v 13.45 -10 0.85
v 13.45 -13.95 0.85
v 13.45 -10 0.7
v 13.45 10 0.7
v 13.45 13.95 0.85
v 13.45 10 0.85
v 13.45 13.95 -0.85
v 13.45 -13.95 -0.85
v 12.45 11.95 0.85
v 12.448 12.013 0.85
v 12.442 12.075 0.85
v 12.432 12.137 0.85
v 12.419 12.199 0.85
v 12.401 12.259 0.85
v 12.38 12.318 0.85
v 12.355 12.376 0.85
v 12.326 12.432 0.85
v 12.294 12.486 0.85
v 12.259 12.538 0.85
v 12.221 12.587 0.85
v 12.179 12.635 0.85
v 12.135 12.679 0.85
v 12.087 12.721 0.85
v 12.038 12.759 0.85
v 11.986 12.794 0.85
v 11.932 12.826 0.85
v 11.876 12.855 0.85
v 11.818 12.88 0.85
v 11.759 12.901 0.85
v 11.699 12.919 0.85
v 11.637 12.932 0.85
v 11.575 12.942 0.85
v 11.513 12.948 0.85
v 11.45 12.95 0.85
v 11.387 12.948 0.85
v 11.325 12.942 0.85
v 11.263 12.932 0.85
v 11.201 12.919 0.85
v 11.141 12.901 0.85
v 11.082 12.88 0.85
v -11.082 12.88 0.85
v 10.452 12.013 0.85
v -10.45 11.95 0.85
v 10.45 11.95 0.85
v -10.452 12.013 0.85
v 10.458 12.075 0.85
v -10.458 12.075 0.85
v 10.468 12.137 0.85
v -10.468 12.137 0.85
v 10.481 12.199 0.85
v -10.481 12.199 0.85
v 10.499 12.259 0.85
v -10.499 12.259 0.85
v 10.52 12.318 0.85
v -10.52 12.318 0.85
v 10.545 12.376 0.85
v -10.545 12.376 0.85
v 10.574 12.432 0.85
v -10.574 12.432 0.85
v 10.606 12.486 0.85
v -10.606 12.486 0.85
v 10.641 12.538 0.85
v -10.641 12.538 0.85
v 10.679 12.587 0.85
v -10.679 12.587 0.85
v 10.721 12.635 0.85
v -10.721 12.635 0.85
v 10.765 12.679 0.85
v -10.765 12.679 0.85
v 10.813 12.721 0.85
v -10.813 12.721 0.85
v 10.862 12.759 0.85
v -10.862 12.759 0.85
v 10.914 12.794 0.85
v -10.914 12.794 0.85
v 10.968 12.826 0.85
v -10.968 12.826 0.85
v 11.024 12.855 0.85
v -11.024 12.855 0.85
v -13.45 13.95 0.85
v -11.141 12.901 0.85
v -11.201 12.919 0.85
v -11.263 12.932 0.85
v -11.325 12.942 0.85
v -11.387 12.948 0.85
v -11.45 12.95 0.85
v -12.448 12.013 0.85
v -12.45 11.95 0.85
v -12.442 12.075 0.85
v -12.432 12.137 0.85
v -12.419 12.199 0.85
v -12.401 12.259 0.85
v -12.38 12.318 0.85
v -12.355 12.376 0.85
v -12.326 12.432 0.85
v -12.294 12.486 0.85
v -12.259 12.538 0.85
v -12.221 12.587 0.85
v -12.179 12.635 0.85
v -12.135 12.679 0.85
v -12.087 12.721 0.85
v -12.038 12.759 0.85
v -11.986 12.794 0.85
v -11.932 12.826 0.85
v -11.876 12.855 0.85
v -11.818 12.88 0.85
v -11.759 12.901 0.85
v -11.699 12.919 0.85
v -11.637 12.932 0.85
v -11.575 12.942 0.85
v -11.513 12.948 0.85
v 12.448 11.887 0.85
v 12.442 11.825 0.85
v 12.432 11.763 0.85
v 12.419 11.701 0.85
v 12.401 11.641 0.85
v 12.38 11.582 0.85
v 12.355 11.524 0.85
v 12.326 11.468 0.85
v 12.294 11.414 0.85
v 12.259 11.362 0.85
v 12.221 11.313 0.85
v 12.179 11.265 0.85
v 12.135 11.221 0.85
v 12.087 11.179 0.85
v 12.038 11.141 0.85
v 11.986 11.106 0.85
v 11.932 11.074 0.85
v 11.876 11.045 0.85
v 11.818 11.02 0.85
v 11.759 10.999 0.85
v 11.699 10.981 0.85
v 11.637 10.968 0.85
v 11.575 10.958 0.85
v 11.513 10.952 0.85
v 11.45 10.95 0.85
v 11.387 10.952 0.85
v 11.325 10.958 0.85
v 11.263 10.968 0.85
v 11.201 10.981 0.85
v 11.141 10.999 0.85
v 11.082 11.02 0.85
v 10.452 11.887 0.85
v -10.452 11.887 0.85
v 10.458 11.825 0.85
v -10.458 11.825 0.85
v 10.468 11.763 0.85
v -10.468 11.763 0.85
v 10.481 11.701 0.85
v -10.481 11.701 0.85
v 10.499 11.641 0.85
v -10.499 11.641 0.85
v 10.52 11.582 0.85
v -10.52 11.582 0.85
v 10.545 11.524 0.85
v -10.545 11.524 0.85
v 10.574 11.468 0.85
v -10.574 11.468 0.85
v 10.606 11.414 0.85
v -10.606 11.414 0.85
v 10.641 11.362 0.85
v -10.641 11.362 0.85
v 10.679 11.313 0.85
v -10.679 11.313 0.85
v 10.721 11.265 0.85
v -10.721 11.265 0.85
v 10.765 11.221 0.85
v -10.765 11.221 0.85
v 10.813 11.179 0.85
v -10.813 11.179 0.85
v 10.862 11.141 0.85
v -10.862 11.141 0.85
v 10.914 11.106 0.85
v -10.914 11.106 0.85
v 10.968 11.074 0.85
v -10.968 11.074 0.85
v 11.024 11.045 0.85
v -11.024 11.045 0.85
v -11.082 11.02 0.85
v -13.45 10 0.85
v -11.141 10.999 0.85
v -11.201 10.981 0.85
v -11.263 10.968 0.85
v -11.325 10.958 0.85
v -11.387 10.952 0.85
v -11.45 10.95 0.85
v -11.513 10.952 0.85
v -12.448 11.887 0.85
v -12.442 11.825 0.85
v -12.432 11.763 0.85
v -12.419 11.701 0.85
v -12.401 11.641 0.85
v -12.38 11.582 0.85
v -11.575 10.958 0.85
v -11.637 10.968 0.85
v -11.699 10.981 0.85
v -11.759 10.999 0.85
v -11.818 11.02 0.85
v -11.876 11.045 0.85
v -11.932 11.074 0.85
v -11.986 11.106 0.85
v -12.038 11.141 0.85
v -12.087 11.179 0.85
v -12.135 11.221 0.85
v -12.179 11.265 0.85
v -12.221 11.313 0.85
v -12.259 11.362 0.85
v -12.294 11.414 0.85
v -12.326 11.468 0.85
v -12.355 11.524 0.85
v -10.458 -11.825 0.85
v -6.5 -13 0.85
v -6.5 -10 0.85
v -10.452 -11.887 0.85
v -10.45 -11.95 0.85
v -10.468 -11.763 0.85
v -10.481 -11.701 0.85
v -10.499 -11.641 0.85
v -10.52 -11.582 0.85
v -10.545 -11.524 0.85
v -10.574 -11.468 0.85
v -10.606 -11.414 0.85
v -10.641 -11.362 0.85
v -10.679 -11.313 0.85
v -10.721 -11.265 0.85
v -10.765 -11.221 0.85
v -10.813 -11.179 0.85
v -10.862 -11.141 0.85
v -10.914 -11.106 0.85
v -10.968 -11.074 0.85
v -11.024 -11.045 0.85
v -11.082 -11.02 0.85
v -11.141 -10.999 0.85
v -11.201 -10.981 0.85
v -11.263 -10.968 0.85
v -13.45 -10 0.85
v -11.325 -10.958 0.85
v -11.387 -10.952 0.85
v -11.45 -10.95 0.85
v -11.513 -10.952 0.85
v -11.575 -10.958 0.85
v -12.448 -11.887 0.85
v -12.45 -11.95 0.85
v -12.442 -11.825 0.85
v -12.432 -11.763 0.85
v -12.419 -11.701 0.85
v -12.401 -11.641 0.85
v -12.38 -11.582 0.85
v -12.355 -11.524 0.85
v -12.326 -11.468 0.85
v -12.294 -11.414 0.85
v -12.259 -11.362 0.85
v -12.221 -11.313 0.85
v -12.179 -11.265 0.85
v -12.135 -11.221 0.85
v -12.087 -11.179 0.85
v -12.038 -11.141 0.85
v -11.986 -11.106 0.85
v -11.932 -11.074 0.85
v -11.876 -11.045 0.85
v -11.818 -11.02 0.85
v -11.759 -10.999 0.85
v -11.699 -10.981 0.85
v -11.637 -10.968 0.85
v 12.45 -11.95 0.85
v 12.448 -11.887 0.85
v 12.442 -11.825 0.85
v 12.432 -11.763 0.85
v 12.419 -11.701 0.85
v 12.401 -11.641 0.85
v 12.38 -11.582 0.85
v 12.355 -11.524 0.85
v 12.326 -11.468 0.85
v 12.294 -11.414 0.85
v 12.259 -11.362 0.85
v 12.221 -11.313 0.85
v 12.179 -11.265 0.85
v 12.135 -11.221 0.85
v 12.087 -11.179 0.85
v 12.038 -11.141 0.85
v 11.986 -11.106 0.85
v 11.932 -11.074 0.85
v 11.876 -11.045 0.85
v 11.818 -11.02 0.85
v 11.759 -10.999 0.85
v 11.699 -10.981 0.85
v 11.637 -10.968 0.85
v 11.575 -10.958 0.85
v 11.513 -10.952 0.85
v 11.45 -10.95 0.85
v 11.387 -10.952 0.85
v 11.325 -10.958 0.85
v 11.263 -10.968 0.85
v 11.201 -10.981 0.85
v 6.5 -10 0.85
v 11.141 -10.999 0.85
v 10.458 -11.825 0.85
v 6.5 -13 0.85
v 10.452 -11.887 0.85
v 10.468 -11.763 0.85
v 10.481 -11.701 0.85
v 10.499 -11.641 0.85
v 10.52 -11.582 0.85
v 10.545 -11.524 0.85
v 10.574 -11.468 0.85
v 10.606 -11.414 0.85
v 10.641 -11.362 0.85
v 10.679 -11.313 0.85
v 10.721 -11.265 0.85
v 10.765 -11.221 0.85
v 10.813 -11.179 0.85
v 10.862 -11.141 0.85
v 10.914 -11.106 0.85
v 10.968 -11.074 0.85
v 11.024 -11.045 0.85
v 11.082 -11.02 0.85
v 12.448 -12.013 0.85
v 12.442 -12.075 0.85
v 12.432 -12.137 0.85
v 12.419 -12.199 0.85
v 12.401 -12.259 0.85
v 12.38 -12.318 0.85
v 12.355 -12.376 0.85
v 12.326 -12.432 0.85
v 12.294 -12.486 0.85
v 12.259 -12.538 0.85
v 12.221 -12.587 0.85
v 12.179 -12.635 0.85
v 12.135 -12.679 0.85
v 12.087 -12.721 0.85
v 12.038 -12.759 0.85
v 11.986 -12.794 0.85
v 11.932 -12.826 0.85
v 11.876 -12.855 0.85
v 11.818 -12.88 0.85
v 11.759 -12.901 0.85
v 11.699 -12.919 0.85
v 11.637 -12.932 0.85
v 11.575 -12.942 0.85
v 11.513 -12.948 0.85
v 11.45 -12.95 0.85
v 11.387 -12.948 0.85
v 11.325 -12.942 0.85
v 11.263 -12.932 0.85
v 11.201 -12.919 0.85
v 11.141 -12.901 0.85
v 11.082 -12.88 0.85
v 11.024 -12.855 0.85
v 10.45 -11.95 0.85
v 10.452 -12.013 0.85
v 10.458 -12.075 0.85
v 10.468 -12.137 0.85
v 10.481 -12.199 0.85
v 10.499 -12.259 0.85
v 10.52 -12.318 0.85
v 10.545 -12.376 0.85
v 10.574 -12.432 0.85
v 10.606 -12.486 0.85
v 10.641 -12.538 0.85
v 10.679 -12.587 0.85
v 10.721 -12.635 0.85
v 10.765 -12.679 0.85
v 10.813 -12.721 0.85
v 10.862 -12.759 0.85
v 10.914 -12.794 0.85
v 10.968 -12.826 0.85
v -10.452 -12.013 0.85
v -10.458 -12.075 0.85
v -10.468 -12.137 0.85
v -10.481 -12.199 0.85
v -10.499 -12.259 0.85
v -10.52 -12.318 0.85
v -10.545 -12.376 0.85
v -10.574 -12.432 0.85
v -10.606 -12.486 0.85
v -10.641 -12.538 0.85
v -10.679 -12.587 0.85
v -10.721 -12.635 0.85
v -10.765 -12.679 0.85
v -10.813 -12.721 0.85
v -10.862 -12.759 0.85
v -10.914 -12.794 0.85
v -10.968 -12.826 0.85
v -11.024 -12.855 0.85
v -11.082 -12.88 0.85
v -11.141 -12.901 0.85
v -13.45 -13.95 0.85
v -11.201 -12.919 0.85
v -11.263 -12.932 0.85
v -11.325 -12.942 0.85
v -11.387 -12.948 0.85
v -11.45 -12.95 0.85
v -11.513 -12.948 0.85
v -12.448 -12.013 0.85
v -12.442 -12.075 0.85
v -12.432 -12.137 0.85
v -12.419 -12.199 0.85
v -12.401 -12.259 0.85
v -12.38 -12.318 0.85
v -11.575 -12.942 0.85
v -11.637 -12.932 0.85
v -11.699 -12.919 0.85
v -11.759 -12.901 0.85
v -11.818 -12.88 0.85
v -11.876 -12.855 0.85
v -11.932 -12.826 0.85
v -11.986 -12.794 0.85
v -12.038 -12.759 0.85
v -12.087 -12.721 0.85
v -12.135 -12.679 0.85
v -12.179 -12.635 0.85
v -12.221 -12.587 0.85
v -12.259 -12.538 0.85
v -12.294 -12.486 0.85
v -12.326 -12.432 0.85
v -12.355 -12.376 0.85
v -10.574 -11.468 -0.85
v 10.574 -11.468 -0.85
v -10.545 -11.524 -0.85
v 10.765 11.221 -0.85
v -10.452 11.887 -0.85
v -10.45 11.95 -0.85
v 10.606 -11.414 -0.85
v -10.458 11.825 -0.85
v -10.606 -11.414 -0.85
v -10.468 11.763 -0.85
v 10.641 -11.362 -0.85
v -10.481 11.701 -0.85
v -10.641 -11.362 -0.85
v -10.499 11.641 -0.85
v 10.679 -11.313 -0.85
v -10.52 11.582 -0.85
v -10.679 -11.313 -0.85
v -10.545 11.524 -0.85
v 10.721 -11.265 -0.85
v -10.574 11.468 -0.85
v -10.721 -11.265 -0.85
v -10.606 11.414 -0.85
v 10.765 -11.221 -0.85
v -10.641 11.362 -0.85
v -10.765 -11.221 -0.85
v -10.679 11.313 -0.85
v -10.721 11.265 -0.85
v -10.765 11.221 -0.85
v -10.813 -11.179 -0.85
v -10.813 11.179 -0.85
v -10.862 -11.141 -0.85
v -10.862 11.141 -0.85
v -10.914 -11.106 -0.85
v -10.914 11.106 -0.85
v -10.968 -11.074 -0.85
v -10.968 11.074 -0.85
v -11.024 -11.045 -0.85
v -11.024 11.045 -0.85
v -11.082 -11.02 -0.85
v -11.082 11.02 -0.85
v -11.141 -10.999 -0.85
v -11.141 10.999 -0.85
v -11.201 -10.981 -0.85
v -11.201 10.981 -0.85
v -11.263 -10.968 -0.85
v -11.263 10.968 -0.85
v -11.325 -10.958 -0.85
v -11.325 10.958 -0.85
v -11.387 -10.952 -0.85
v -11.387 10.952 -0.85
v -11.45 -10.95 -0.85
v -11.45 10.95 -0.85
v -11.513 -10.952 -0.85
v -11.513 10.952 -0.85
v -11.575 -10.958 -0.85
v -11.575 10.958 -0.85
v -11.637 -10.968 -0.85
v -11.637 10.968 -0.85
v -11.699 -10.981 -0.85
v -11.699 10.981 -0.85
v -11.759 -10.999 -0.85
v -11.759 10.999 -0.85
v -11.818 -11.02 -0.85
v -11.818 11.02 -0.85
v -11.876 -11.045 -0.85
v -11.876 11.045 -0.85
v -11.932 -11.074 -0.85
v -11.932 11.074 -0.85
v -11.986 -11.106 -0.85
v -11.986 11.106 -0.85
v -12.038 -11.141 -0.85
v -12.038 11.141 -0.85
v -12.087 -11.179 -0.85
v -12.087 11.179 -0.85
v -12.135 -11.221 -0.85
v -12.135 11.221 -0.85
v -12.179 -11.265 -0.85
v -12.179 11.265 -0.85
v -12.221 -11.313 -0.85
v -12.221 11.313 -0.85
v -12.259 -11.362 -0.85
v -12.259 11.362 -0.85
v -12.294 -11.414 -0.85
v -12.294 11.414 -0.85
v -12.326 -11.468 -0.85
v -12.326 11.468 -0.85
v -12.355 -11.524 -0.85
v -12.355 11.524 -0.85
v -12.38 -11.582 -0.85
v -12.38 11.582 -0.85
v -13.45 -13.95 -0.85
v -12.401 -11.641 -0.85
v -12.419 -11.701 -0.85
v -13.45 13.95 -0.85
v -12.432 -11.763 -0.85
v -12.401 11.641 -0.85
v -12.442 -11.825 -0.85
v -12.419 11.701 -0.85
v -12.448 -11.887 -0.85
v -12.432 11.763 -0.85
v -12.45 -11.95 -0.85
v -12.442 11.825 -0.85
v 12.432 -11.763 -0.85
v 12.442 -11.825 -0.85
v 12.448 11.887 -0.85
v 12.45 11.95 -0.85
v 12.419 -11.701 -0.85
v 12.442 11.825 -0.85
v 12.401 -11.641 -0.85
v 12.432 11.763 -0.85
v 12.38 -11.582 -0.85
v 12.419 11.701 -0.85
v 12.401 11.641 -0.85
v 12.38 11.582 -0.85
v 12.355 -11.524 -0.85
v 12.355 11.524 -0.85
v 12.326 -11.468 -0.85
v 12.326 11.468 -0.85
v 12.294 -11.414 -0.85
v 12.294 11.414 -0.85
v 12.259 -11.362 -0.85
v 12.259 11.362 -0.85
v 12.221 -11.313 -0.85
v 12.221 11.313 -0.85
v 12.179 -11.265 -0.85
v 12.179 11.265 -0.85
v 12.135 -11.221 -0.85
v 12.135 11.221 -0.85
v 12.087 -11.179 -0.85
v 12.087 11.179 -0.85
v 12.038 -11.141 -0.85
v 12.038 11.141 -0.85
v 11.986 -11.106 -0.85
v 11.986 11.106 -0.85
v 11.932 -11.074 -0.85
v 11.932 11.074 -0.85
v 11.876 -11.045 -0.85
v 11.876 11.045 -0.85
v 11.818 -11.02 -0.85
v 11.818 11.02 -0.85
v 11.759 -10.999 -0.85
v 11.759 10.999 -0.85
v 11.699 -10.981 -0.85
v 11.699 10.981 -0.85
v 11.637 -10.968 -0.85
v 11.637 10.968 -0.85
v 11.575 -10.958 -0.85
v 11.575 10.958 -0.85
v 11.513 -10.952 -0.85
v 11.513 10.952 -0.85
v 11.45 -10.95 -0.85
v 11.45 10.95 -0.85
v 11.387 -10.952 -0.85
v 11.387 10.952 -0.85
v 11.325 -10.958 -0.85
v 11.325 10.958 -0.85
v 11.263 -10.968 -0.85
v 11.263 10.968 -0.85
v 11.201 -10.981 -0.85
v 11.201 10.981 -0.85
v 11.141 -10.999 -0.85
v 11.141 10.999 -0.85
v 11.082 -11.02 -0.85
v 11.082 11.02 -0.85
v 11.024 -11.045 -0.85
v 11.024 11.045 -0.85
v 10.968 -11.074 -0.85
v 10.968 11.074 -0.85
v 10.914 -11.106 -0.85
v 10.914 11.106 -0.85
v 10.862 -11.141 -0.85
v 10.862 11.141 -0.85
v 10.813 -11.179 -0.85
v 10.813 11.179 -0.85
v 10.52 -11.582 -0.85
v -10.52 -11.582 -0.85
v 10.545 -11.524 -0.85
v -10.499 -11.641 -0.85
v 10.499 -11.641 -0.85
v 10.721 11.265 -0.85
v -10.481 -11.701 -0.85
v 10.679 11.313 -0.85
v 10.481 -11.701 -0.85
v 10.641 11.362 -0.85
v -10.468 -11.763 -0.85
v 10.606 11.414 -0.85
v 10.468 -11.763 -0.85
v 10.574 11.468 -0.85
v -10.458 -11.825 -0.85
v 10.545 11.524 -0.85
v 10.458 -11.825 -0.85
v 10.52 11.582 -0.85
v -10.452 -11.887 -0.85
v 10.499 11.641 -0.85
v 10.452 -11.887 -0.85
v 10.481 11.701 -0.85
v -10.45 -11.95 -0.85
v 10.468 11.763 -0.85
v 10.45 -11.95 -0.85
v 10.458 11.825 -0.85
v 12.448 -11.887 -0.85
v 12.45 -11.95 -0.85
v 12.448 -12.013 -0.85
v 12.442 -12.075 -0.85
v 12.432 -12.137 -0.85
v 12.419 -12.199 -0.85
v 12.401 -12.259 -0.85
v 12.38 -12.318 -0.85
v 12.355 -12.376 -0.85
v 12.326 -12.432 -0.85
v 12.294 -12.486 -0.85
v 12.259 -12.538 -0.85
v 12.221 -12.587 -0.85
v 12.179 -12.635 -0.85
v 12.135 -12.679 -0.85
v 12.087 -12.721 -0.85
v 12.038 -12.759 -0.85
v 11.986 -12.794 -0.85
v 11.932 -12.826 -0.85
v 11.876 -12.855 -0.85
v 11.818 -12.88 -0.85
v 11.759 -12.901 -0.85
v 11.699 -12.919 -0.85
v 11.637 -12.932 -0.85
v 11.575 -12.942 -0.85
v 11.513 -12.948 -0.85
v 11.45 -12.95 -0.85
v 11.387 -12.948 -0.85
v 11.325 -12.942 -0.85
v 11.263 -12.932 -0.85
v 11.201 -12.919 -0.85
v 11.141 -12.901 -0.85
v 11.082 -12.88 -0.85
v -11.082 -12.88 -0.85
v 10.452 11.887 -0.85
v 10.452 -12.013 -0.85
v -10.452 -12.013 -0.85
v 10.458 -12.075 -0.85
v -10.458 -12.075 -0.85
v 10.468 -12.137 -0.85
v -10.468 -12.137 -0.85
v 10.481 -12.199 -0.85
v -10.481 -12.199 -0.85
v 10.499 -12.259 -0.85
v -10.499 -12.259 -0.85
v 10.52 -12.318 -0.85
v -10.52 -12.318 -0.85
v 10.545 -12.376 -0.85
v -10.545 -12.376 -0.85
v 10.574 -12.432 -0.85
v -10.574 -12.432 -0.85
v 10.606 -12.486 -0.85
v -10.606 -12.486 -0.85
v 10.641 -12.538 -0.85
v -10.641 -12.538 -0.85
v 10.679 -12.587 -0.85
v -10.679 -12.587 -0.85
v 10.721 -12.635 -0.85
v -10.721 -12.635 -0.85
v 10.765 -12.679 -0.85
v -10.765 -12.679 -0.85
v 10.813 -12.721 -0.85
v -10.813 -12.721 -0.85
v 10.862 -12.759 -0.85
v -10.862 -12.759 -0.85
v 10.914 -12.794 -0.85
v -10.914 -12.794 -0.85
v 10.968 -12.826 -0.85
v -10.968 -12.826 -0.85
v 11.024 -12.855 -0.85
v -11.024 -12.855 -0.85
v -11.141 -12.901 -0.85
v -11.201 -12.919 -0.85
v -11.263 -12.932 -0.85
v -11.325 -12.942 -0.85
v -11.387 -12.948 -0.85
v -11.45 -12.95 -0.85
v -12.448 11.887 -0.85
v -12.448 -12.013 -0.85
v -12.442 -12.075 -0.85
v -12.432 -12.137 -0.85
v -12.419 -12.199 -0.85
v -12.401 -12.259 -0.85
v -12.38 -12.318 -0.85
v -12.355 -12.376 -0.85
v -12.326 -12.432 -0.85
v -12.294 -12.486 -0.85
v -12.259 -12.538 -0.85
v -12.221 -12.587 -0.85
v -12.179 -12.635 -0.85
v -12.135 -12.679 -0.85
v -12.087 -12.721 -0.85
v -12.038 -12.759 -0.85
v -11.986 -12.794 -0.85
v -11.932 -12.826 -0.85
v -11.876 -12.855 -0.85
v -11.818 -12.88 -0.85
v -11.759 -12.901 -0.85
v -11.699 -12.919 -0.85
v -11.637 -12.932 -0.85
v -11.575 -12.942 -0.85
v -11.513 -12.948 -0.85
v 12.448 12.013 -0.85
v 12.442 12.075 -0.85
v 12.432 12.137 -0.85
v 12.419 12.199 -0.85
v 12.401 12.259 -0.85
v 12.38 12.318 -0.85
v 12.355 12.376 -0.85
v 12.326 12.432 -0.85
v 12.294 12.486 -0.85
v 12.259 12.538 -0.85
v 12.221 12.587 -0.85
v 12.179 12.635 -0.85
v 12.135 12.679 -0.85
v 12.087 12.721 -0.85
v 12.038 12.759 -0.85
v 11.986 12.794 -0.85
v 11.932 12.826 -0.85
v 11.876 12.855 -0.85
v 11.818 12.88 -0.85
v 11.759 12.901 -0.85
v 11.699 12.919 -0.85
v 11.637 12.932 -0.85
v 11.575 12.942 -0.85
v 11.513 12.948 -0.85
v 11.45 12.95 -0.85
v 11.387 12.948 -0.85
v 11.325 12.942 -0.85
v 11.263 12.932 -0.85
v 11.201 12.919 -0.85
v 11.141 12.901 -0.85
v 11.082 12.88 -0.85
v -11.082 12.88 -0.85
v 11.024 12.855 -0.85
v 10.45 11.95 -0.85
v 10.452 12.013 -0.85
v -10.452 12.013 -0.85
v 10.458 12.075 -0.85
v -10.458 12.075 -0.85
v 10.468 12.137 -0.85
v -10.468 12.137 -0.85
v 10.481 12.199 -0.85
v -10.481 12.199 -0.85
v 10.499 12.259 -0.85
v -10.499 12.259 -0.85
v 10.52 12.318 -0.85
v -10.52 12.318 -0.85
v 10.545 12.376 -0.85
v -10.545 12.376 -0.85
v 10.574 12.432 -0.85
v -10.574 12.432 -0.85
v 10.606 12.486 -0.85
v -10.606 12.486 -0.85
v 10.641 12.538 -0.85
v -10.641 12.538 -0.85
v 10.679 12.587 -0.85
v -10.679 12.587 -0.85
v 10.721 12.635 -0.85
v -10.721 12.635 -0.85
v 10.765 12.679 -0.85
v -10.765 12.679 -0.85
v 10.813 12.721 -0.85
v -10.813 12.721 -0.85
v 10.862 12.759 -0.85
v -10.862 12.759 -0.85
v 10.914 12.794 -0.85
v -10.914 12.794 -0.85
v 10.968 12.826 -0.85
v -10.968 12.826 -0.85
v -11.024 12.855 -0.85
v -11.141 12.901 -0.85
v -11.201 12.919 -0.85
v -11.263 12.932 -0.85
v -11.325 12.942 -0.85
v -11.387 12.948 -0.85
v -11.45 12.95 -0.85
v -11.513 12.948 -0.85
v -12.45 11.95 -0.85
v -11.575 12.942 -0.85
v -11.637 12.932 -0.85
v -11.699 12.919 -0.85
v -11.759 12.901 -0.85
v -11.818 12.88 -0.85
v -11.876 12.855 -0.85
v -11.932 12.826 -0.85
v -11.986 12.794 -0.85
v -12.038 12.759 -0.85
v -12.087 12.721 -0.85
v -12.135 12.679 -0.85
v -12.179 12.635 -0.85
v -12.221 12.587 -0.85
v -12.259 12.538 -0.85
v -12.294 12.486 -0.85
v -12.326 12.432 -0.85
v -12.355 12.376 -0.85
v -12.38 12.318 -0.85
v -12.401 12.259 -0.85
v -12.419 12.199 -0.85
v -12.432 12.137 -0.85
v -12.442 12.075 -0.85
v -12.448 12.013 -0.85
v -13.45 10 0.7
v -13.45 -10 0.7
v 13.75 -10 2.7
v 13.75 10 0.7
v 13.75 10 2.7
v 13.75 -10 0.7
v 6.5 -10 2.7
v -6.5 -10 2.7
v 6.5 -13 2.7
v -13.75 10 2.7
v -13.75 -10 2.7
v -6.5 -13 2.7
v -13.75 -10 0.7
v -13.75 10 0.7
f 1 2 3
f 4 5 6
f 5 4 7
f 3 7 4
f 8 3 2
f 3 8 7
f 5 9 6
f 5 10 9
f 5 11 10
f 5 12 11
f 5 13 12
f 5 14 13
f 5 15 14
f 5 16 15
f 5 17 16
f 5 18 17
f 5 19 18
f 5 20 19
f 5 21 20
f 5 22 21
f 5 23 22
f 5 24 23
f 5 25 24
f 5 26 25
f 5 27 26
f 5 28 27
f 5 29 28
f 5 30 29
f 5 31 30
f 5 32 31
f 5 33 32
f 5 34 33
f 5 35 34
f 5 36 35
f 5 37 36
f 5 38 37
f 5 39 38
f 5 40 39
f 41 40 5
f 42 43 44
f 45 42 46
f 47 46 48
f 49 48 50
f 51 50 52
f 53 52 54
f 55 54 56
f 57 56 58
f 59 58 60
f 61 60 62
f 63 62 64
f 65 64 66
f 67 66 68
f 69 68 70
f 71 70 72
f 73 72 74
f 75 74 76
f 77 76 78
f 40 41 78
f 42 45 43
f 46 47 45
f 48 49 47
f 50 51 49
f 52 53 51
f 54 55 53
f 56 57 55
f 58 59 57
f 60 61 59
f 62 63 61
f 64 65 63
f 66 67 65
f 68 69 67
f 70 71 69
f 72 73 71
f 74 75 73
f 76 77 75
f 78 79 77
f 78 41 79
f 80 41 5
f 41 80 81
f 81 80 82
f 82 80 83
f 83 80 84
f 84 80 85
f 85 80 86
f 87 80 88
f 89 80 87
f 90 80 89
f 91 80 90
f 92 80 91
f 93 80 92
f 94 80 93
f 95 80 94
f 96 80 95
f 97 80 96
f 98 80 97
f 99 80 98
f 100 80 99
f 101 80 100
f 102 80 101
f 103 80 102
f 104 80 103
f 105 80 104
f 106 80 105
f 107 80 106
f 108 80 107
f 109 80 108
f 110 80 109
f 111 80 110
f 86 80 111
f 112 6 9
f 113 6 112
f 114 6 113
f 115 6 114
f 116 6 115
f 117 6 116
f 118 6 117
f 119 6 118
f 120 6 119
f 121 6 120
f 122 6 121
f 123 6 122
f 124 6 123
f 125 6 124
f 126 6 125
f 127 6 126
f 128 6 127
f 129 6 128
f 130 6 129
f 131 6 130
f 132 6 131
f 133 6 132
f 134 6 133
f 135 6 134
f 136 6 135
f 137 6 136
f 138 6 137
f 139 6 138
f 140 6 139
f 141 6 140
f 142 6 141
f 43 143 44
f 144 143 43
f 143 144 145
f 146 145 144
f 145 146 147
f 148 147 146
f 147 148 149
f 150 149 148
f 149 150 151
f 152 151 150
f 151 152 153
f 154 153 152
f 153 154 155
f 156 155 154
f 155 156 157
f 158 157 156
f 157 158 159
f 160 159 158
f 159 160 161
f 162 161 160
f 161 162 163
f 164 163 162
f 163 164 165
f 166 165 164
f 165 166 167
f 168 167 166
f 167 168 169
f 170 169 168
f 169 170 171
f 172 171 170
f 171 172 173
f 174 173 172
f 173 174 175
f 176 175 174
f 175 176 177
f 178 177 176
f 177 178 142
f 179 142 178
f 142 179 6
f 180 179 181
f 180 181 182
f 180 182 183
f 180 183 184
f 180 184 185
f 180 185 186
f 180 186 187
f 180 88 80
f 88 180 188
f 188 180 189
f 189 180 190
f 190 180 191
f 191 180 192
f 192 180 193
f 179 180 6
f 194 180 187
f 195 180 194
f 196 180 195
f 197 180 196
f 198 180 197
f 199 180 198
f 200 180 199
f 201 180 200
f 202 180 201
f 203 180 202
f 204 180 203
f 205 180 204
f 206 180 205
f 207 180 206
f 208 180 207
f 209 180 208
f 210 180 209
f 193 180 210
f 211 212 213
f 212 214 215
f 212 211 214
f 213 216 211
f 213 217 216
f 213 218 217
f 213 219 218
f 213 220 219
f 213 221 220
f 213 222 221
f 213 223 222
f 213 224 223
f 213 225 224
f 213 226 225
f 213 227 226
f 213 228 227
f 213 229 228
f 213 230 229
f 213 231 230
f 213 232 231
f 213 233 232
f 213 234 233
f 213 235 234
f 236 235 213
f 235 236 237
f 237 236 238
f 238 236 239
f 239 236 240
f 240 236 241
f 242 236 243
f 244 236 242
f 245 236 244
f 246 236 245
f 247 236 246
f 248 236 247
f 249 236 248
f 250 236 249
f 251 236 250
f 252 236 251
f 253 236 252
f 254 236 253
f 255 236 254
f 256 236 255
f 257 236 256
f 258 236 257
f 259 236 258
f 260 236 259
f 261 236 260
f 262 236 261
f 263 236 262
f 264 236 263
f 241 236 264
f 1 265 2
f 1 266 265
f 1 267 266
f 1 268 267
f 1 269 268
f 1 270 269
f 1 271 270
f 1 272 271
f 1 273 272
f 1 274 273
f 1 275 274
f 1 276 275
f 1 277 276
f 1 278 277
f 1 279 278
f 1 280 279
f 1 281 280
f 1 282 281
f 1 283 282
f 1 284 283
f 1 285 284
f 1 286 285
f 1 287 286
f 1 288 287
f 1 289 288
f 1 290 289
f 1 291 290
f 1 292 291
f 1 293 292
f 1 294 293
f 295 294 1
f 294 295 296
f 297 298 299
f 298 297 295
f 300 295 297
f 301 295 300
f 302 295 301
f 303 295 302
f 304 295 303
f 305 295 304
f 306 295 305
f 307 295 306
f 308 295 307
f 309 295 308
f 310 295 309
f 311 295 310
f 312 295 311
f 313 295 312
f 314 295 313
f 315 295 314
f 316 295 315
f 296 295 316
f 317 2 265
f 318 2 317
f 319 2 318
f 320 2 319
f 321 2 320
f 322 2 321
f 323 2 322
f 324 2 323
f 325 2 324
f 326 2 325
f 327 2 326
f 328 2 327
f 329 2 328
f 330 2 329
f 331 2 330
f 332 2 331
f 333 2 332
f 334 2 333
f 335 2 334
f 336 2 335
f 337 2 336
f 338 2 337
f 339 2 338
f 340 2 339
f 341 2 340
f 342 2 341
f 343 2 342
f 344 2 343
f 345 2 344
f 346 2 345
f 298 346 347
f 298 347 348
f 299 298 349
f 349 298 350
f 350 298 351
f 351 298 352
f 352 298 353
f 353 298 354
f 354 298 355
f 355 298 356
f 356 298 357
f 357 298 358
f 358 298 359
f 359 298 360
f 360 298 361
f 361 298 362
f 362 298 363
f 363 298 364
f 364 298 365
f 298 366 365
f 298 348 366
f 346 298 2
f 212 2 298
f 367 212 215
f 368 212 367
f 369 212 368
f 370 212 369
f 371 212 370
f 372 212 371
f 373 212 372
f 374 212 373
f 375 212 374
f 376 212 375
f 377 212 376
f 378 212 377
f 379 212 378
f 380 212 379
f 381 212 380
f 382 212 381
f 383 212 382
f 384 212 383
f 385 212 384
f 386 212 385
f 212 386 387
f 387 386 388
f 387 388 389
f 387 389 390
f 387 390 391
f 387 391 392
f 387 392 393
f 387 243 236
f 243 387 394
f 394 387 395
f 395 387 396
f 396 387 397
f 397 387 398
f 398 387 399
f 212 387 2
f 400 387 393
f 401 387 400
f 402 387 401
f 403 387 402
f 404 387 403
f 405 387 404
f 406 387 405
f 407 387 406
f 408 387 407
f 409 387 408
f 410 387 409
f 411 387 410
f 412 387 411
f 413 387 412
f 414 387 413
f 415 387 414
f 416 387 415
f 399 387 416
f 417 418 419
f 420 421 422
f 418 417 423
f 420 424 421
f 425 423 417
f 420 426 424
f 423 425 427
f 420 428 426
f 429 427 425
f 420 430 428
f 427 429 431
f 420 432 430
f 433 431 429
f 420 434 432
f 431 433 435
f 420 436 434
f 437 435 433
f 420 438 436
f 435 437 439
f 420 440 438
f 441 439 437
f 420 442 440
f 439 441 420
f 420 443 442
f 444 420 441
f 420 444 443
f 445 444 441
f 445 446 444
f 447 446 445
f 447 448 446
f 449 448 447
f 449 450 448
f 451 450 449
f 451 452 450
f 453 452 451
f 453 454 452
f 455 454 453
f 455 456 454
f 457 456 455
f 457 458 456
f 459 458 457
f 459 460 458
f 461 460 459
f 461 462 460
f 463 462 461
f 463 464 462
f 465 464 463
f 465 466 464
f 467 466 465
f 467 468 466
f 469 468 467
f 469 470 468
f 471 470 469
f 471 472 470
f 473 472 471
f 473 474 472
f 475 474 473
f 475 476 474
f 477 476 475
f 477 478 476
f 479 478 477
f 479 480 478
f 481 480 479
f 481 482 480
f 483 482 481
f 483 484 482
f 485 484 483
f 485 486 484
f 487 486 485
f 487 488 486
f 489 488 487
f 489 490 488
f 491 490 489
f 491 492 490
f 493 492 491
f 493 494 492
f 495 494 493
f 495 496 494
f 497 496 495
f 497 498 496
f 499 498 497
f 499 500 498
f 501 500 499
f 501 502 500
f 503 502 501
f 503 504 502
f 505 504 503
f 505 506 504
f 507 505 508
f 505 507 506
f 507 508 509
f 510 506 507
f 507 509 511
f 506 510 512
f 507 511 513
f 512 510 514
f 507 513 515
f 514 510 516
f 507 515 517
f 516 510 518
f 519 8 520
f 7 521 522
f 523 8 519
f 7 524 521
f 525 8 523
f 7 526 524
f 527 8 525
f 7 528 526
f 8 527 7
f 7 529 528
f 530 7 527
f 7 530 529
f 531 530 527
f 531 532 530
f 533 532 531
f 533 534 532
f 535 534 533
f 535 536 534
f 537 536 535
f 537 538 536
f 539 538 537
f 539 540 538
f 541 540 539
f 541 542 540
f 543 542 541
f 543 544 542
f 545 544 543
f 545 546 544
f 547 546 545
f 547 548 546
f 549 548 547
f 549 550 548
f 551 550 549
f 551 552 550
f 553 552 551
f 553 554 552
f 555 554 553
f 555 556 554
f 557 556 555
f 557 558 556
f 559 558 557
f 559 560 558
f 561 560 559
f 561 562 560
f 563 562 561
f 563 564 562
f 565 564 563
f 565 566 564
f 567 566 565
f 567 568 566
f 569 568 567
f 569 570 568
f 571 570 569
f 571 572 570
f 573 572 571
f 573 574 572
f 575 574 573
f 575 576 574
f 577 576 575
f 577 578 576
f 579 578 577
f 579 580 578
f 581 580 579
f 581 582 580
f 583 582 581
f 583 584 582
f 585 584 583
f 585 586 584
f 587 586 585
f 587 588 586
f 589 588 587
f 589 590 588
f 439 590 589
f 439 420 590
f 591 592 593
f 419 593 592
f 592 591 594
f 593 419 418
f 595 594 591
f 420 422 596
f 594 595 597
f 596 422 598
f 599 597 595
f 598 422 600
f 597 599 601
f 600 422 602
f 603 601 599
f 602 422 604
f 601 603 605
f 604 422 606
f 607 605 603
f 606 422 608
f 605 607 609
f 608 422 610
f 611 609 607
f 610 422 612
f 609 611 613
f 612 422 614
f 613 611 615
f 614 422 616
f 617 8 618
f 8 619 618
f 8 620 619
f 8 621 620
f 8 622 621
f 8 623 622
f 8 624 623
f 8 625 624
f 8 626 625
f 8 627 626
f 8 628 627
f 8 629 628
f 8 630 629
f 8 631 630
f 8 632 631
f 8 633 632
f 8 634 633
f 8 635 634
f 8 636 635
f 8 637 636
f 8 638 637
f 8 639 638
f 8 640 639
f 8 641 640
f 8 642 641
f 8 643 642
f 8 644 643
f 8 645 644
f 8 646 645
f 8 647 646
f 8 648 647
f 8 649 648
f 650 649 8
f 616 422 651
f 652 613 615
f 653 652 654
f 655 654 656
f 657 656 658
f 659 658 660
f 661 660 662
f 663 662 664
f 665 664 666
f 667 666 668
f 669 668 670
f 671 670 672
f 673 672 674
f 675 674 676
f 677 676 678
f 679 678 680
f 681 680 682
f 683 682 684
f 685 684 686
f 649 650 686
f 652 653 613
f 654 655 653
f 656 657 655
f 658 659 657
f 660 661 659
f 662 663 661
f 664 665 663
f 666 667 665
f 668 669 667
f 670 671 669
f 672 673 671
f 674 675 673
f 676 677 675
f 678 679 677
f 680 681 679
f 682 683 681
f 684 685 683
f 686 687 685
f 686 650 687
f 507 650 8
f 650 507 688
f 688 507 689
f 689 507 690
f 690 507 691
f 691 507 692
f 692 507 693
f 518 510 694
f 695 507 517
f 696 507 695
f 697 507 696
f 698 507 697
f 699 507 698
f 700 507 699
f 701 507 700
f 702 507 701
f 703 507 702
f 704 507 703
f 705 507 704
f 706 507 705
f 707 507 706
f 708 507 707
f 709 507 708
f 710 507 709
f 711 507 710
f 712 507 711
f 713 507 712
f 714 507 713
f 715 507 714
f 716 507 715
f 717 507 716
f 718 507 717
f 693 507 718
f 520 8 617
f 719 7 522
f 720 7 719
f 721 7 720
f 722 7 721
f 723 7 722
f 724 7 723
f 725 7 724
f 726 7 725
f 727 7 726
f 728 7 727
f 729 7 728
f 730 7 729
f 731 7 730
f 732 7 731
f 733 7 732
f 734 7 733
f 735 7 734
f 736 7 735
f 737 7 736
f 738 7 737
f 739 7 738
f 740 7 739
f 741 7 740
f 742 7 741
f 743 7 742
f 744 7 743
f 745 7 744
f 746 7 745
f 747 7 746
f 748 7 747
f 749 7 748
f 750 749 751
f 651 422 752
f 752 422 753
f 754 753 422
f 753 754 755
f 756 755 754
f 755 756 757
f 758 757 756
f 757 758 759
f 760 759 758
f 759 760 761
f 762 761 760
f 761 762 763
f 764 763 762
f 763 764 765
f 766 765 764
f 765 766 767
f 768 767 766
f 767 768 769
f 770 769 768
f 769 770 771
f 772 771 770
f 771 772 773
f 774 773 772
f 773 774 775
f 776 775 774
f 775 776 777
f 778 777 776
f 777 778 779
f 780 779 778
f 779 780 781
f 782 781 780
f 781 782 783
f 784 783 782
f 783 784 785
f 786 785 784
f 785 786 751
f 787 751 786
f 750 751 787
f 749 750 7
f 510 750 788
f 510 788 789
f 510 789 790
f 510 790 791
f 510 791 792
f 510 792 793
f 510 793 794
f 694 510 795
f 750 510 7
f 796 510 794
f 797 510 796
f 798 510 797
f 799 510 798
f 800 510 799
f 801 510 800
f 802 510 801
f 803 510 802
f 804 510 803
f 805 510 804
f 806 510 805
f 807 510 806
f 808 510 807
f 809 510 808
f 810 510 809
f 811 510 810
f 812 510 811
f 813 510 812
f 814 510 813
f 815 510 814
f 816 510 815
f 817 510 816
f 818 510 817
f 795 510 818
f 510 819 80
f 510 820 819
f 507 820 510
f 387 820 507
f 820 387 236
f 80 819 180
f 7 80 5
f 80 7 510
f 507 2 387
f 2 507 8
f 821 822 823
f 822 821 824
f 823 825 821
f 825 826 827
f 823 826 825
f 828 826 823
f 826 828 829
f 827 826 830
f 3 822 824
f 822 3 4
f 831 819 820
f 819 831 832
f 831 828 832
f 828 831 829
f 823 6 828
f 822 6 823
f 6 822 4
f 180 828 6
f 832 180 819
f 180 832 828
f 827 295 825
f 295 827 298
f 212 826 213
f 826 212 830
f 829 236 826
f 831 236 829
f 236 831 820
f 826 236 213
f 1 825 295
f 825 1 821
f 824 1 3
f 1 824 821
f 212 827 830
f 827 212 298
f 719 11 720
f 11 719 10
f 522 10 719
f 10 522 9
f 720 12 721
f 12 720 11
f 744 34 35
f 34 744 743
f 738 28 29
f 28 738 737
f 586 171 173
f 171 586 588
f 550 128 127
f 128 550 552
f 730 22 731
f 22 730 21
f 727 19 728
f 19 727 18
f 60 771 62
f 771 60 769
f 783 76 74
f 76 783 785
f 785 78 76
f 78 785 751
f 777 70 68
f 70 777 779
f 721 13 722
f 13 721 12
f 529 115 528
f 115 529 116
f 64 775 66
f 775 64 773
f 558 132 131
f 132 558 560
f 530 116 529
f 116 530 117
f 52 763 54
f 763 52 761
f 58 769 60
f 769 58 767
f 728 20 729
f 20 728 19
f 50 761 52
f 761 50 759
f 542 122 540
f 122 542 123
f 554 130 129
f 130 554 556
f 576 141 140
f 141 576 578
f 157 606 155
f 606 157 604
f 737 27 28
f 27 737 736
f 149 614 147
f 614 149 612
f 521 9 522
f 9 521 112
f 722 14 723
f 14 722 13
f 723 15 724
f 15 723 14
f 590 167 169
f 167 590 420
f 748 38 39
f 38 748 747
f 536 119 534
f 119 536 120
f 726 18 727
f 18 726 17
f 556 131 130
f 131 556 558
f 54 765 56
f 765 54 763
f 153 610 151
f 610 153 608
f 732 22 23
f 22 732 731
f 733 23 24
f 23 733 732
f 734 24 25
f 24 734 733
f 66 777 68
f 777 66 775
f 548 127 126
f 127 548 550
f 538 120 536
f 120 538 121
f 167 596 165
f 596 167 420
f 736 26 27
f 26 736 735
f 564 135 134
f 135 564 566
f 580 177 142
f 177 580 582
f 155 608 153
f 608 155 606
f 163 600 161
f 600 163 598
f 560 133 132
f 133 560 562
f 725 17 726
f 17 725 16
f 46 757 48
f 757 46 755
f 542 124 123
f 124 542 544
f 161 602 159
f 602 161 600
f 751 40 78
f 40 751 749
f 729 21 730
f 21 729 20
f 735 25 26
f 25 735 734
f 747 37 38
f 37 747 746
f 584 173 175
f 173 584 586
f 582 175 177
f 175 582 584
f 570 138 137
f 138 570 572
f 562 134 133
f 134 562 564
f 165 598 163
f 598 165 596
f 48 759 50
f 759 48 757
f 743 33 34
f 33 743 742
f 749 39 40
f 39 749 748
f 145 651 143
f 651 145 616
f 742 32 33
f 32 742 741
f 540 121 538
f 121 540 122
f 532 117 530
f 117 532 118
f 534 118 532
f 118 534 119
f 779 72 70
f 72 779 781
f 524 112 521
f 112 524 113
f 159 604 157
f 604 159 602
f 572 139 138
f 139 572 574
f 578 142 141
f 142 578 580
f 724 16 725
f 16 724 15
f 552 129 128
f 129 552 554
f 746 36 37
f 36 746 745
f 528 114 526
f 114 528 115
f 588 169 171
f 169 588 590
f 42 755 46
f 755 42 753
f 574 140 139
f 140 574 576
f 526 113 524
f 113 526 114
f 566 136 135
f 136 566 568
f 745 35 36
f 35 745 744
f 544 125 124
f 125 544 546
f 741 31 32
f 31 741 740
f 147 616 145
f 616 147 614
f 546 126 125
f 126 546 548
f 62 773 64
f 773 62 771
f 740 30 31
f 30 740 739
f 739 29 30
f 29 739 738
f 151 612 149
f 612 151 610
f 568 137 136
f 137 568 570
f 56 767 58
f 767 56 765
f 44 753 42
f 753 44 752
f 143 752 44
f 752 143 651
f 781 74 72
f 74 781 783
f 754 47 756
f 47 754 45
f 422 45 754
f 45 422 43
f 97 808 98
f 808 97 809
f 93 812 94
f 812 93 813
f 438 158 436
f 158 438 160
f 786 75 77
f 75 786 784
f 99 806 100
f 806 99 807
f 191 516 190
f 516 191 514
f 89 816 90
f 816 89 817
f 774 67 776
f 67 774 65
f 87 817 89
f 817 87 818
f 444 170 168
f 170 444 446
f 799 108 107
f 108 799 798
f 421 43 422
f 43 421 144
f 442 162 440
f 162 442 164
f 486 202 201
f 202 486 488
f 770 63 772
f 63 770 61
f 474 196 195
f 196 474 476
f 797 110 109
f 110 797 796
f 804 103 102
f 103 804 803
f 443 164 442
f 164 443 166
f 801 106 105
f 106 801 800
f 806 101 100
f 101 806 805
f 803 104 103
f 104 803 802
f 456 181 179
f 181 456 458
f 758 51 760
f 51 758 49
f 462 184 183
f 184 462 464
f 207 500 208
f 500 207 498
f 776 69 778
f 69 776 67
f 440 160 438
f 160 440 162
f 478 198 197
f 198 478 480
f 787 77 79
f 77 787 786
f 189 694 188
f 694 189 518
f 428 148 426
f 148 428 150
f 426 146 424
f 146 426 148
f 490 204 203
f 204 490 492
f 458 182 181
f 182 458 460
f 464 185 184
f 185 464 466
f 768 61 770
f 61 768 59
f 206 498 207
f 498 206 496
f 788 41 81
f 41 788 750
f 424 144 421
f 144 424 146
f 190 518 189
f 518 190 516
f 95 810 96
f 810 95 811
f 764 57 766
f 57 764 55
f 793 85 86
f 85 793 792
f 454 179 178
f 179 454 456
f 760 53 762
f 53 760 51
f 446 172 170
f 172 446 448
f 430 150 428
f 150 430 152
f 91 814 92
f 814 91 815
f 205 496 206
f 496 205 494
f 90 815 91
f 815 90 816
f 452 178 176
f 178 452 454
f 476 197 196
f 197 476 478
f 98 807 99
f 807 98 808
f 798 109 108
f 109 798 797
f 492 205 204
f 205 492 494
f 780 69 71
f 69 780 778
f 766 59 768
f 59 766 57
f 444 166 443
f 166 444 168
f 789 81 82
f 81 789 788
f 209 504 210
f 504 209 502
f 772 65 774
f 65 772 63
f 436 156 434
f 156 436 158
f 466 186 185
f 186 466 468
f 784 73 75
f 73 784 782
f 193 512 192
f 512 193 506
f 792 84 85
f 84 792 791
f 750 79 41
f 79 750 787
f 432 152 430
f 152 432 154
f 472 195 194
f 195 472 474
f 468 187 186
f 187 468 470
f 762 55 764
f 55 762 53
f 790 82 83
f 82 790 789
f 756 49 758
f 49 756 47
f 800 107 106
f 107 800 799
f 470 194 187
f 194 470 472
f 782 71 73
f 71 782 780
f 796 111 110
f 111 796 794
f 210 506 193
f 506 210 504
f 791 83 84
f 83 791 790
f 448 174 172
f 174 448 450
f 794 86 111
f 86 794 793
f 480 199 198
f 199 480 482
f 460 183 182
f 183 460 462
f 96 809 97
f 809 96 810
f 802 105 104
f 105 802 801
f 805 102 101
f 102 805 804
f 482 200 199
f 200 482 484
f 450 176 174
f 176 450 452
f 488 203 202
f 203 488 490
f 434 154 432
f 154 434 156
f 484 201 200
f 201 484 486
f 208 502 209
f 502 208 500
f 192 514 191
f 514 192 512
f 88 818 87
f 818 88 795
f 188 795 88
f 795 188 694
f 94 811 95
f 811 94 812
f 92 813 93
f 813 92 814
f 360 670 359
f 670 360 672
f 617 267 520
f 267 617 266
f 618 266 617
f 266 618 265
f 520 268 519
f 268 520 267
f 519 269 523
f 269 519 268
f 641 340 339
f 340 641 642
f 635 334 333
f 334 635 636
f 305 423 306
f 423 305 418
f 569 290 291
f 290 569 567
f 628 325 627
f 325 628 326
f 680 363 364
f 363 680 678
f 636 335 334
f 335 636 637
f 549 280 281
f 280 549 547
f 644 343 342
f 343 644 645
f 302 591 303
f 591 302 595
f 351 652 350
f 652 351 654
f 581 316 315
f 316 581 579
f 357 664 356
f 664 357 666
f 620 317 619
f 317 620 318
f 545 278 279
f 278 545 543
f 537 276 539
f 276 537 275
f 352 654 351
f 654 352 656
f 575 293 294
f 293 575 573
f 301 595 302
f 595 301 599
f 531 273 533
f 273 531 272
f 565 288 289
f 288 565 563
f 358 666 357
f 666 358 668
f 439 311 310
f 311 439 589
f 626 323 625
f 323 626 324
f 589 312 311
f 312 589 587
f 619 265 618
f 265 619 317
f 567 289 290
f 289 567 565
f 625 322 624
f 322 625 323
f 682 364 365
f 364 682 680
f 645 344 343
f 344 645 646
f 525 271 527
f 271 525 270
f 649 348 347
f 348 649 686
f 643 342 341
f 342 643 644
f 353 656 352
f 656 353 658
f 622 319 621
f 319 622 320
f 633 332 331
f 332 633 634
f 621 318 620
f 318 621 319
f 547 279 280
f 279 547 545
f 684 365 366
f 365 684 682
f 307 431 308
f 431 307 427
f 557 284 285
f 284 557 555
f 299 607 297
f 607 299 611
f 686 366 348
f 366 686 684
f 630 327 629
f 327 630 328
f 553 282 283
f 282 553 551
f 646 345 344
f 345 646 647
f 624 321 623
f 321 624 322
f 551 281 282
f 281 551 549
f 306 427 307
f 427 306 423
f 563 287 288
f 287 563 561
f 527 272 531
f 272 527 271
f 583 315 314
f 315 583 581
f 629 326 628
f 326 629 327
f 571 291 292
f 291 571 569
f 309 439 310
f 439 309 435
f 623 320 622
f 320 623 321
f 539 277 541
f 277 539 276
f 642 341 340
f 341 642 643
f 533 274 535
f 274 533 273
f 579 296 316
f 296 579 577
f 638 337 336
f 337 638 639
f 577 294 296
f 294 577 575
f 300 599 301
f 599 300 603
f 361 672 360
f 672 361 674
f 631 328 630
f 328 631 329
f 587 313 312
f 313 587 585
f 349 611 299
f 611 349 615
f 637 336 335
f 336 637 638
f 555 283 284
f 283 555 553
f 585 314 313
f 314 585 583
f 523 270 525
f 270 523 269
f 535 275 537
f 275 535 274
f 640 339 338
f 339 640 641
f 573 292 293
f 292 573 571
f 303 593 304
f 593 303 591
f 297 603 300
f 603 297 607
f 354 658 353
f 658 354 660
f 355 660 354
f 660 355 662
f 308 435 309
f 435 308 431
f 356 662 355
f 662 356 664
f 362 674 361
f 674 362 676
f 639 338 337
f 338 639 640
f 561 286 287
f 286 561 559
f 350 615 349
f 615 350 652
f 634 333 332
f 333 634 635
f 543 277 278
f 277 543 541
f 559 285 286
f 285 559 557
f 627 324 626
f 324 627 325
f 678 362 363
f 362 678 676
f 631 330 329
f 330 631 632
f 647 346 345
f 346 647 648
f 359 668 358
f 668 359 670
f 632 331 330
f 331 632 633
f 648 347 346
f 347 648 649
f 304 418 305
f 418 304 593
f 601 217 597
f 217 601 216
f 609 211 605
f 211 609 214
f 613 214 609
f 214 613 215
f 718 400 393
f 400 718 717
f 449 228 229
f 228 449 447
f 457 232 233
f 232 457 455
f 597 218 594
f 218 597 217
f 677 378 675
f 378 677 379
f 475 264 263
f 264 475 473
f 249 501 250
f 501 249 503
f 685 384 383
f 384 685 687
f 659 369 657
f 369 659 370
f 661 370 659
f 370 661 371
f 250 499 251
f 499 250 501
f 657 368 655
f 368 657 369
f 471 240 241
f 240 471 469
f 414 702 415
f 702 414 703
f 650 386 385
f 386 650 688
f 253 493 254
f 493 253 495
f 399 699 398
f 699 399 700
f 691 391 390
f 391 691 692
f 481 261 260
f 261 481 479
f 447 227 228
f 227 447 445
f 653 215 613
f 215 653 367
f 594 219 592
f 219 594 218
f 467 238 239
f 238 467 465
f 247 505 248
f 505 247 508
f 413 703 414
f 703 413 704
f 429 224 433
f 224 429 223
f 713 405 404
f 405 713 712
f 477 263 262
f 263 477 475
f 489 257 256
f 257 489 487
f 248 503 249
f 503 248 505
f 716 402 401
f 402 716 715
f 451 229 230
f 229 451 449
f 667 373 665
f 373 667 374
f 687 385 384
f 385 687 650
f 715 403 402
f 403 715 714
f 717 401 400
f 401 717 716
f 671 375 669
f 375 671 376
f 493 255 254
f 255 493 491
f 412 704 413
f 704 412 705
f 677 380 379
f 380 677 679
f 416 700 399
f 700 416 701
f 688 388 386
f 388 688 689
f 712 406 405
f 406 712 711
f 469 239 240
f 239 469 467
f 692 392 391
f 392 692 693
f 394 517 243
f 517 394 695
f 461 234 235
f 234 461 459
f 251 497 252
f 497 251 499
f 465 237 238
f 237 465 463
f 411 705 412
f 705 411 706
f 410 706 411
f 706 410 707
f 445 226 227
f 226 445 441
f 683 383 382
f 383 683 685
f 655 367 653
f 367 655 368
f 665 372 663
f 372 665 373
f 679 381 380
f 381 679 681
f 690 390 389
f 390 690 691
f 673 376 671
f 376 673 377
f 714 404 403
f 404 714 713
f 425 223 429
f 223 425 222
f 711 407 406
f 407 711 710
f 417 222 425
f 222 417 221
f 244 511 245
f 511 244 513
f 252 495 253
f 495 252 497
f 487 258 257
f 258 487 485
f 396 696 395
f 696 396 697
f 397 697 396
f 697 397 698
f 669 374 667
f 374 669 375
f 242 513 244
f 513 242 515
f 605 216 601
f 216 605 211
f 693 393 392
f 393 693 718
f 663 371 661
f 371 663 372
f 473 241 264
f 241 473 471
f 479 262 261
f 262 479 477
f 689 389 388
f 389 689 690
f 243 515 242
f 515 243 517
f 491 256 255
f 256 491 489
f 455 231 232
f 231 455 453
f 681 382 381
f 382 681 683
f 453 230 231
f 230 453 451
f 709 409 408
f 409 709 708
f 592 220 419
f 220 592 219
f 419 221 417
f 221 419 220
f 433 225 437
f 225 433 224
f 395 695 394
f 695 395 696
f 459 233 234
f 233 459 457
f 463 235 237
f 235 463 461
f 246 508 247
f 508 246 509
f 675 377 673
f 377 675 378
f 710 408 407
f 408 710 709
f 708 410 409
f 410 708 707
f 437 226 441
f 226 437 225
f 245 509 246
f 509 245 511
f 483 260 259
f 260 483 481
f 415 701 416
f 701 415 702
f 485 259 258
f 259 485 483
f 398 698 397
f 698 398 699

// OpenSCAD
$fn=100;

// Variables para PCB y componentes
diffWiggle = 0.2; // pequeña diferencia para restar sobre bordes
PCB1306holeD = 2;
PCB1306holeOff = [2, 2, 0];
PCB1306Z = 1.7;
PCB1306X = 26.9;
PCB1306Y = 27.9;
PCB1306 = [PCB1306X, PCB1306Y, PCB1306Z];

// Componentes superiores LCD
LCDmaskY = 4; // cuánto cubrir en la parte inferior
LCDX = 27.5;
LCDY = 20;
LCDZ = 2;
LCDflexX = 13;
LCDflexY = 3;
LCD = [LCDX, LCDY, LCDZ];
LCDpos = [0, 0, PCB1306[2]];
LCDviewPos = [0, LCDmaskY/2, PCB1306[2]];
LCDmask = [LCD[0], LCDmaskY, LCD[2]];
LCDmaskPos = [0, -LCD[1]/2 + LCDmask[1]/2, LCDpos[2]];
LCDview = [LCD[0], LCD[1] - LCDmask[1], LCD[2]];
LCDflex = [LCDflexX, LCDflexY, LCD[2]];
LCDflexPos = [0, -LCD[1]/2 - LCDflex[1]/2, PCB1306[2]];

// Array de objetos para capas
extrudeFalse = false;
extrudeTrue = true;
object = [
    [PCB1306, [0, 0, 0], "green", extrudeFalse],
    [LCDview, LCDviewPos, "black", extrudeTrue],
    [LCDflex, LCDflexPos, "brown", extrudeTrue],
    [LCDmask, LCDmaskPos, "grey", extrudeTrue]
];

// Módulo para pines de montaje
module pegs(XYZ, offset, holeD) {
    H = XYZ[2];
    XY = [XYZ[0], XYZ[1], 0];
    
    TR = [ [+1, 0, 0], [0, +1, 0], [0, 0, 0] ];
    TL = [ [-1, 0, 0], [0, +1, 0], [0, 0, 0] ];
    BR = [ [+1, 0, 0], [0, -1, 0], [0, 0, 0] ];
    BL = [ [-1, 0, 0], [0, -1, 0], [0, 0, 0] ];
    
    // Calculamos posiciones con vectores y offset
    posTR = [ (TR[0][0]*XY[0]/2 + offset[0]*BL[0][0]), (TR[1][1]*XY[1]/2 + offset[1]*BL[1][1]), 0 ];
    posTL = [ (TL[0][0]*XY[0]/2 + offset[0]*BR[0][0]), (TL[1][1]*XY[1]/2 + offset[1]*BR[1][1]), 0 ];
    posBR = [ (BR[0][0]*XY[0]/2 + offset[0]*TL[0][0]), (BR[1][1]*XY[1]/2 + offset[1]*TL[1][1]), 0 ];
    posBL = [ (BL[0][0]*XY[0]/2 + offset[0]*TR[0][0]), (BL[1][1]*XY[1]/2 + offset[1]*TR[1][1]), 0 ];

    translate(posTR) cylinder(h = H, d = holeD, center = true);
    translate(posTL) cylinder(h = H, d = holeD, center = true);
    translate(posBR) cylinder(h = H, d = holeD, center = true);
    translate(posBL) cylinder(h = H, d = holeD, center = true);
}

// Módulo para capas de ladrillos (cubos con color)
module brickLayer(array) {
    module blocks(list) {
        translate(list[1]) color(list[2]) cube(list[0], center = true);
    }
    for (i = [0 : len(array) - 1]) {
        blocks(array[i]);
    }
}

// Salida
difference(){
    brickLayer(object);
    pegs(PCB1306 + [0, 0, diffWiggle], PCB1306holeOff, PCB1306holeD);
}
